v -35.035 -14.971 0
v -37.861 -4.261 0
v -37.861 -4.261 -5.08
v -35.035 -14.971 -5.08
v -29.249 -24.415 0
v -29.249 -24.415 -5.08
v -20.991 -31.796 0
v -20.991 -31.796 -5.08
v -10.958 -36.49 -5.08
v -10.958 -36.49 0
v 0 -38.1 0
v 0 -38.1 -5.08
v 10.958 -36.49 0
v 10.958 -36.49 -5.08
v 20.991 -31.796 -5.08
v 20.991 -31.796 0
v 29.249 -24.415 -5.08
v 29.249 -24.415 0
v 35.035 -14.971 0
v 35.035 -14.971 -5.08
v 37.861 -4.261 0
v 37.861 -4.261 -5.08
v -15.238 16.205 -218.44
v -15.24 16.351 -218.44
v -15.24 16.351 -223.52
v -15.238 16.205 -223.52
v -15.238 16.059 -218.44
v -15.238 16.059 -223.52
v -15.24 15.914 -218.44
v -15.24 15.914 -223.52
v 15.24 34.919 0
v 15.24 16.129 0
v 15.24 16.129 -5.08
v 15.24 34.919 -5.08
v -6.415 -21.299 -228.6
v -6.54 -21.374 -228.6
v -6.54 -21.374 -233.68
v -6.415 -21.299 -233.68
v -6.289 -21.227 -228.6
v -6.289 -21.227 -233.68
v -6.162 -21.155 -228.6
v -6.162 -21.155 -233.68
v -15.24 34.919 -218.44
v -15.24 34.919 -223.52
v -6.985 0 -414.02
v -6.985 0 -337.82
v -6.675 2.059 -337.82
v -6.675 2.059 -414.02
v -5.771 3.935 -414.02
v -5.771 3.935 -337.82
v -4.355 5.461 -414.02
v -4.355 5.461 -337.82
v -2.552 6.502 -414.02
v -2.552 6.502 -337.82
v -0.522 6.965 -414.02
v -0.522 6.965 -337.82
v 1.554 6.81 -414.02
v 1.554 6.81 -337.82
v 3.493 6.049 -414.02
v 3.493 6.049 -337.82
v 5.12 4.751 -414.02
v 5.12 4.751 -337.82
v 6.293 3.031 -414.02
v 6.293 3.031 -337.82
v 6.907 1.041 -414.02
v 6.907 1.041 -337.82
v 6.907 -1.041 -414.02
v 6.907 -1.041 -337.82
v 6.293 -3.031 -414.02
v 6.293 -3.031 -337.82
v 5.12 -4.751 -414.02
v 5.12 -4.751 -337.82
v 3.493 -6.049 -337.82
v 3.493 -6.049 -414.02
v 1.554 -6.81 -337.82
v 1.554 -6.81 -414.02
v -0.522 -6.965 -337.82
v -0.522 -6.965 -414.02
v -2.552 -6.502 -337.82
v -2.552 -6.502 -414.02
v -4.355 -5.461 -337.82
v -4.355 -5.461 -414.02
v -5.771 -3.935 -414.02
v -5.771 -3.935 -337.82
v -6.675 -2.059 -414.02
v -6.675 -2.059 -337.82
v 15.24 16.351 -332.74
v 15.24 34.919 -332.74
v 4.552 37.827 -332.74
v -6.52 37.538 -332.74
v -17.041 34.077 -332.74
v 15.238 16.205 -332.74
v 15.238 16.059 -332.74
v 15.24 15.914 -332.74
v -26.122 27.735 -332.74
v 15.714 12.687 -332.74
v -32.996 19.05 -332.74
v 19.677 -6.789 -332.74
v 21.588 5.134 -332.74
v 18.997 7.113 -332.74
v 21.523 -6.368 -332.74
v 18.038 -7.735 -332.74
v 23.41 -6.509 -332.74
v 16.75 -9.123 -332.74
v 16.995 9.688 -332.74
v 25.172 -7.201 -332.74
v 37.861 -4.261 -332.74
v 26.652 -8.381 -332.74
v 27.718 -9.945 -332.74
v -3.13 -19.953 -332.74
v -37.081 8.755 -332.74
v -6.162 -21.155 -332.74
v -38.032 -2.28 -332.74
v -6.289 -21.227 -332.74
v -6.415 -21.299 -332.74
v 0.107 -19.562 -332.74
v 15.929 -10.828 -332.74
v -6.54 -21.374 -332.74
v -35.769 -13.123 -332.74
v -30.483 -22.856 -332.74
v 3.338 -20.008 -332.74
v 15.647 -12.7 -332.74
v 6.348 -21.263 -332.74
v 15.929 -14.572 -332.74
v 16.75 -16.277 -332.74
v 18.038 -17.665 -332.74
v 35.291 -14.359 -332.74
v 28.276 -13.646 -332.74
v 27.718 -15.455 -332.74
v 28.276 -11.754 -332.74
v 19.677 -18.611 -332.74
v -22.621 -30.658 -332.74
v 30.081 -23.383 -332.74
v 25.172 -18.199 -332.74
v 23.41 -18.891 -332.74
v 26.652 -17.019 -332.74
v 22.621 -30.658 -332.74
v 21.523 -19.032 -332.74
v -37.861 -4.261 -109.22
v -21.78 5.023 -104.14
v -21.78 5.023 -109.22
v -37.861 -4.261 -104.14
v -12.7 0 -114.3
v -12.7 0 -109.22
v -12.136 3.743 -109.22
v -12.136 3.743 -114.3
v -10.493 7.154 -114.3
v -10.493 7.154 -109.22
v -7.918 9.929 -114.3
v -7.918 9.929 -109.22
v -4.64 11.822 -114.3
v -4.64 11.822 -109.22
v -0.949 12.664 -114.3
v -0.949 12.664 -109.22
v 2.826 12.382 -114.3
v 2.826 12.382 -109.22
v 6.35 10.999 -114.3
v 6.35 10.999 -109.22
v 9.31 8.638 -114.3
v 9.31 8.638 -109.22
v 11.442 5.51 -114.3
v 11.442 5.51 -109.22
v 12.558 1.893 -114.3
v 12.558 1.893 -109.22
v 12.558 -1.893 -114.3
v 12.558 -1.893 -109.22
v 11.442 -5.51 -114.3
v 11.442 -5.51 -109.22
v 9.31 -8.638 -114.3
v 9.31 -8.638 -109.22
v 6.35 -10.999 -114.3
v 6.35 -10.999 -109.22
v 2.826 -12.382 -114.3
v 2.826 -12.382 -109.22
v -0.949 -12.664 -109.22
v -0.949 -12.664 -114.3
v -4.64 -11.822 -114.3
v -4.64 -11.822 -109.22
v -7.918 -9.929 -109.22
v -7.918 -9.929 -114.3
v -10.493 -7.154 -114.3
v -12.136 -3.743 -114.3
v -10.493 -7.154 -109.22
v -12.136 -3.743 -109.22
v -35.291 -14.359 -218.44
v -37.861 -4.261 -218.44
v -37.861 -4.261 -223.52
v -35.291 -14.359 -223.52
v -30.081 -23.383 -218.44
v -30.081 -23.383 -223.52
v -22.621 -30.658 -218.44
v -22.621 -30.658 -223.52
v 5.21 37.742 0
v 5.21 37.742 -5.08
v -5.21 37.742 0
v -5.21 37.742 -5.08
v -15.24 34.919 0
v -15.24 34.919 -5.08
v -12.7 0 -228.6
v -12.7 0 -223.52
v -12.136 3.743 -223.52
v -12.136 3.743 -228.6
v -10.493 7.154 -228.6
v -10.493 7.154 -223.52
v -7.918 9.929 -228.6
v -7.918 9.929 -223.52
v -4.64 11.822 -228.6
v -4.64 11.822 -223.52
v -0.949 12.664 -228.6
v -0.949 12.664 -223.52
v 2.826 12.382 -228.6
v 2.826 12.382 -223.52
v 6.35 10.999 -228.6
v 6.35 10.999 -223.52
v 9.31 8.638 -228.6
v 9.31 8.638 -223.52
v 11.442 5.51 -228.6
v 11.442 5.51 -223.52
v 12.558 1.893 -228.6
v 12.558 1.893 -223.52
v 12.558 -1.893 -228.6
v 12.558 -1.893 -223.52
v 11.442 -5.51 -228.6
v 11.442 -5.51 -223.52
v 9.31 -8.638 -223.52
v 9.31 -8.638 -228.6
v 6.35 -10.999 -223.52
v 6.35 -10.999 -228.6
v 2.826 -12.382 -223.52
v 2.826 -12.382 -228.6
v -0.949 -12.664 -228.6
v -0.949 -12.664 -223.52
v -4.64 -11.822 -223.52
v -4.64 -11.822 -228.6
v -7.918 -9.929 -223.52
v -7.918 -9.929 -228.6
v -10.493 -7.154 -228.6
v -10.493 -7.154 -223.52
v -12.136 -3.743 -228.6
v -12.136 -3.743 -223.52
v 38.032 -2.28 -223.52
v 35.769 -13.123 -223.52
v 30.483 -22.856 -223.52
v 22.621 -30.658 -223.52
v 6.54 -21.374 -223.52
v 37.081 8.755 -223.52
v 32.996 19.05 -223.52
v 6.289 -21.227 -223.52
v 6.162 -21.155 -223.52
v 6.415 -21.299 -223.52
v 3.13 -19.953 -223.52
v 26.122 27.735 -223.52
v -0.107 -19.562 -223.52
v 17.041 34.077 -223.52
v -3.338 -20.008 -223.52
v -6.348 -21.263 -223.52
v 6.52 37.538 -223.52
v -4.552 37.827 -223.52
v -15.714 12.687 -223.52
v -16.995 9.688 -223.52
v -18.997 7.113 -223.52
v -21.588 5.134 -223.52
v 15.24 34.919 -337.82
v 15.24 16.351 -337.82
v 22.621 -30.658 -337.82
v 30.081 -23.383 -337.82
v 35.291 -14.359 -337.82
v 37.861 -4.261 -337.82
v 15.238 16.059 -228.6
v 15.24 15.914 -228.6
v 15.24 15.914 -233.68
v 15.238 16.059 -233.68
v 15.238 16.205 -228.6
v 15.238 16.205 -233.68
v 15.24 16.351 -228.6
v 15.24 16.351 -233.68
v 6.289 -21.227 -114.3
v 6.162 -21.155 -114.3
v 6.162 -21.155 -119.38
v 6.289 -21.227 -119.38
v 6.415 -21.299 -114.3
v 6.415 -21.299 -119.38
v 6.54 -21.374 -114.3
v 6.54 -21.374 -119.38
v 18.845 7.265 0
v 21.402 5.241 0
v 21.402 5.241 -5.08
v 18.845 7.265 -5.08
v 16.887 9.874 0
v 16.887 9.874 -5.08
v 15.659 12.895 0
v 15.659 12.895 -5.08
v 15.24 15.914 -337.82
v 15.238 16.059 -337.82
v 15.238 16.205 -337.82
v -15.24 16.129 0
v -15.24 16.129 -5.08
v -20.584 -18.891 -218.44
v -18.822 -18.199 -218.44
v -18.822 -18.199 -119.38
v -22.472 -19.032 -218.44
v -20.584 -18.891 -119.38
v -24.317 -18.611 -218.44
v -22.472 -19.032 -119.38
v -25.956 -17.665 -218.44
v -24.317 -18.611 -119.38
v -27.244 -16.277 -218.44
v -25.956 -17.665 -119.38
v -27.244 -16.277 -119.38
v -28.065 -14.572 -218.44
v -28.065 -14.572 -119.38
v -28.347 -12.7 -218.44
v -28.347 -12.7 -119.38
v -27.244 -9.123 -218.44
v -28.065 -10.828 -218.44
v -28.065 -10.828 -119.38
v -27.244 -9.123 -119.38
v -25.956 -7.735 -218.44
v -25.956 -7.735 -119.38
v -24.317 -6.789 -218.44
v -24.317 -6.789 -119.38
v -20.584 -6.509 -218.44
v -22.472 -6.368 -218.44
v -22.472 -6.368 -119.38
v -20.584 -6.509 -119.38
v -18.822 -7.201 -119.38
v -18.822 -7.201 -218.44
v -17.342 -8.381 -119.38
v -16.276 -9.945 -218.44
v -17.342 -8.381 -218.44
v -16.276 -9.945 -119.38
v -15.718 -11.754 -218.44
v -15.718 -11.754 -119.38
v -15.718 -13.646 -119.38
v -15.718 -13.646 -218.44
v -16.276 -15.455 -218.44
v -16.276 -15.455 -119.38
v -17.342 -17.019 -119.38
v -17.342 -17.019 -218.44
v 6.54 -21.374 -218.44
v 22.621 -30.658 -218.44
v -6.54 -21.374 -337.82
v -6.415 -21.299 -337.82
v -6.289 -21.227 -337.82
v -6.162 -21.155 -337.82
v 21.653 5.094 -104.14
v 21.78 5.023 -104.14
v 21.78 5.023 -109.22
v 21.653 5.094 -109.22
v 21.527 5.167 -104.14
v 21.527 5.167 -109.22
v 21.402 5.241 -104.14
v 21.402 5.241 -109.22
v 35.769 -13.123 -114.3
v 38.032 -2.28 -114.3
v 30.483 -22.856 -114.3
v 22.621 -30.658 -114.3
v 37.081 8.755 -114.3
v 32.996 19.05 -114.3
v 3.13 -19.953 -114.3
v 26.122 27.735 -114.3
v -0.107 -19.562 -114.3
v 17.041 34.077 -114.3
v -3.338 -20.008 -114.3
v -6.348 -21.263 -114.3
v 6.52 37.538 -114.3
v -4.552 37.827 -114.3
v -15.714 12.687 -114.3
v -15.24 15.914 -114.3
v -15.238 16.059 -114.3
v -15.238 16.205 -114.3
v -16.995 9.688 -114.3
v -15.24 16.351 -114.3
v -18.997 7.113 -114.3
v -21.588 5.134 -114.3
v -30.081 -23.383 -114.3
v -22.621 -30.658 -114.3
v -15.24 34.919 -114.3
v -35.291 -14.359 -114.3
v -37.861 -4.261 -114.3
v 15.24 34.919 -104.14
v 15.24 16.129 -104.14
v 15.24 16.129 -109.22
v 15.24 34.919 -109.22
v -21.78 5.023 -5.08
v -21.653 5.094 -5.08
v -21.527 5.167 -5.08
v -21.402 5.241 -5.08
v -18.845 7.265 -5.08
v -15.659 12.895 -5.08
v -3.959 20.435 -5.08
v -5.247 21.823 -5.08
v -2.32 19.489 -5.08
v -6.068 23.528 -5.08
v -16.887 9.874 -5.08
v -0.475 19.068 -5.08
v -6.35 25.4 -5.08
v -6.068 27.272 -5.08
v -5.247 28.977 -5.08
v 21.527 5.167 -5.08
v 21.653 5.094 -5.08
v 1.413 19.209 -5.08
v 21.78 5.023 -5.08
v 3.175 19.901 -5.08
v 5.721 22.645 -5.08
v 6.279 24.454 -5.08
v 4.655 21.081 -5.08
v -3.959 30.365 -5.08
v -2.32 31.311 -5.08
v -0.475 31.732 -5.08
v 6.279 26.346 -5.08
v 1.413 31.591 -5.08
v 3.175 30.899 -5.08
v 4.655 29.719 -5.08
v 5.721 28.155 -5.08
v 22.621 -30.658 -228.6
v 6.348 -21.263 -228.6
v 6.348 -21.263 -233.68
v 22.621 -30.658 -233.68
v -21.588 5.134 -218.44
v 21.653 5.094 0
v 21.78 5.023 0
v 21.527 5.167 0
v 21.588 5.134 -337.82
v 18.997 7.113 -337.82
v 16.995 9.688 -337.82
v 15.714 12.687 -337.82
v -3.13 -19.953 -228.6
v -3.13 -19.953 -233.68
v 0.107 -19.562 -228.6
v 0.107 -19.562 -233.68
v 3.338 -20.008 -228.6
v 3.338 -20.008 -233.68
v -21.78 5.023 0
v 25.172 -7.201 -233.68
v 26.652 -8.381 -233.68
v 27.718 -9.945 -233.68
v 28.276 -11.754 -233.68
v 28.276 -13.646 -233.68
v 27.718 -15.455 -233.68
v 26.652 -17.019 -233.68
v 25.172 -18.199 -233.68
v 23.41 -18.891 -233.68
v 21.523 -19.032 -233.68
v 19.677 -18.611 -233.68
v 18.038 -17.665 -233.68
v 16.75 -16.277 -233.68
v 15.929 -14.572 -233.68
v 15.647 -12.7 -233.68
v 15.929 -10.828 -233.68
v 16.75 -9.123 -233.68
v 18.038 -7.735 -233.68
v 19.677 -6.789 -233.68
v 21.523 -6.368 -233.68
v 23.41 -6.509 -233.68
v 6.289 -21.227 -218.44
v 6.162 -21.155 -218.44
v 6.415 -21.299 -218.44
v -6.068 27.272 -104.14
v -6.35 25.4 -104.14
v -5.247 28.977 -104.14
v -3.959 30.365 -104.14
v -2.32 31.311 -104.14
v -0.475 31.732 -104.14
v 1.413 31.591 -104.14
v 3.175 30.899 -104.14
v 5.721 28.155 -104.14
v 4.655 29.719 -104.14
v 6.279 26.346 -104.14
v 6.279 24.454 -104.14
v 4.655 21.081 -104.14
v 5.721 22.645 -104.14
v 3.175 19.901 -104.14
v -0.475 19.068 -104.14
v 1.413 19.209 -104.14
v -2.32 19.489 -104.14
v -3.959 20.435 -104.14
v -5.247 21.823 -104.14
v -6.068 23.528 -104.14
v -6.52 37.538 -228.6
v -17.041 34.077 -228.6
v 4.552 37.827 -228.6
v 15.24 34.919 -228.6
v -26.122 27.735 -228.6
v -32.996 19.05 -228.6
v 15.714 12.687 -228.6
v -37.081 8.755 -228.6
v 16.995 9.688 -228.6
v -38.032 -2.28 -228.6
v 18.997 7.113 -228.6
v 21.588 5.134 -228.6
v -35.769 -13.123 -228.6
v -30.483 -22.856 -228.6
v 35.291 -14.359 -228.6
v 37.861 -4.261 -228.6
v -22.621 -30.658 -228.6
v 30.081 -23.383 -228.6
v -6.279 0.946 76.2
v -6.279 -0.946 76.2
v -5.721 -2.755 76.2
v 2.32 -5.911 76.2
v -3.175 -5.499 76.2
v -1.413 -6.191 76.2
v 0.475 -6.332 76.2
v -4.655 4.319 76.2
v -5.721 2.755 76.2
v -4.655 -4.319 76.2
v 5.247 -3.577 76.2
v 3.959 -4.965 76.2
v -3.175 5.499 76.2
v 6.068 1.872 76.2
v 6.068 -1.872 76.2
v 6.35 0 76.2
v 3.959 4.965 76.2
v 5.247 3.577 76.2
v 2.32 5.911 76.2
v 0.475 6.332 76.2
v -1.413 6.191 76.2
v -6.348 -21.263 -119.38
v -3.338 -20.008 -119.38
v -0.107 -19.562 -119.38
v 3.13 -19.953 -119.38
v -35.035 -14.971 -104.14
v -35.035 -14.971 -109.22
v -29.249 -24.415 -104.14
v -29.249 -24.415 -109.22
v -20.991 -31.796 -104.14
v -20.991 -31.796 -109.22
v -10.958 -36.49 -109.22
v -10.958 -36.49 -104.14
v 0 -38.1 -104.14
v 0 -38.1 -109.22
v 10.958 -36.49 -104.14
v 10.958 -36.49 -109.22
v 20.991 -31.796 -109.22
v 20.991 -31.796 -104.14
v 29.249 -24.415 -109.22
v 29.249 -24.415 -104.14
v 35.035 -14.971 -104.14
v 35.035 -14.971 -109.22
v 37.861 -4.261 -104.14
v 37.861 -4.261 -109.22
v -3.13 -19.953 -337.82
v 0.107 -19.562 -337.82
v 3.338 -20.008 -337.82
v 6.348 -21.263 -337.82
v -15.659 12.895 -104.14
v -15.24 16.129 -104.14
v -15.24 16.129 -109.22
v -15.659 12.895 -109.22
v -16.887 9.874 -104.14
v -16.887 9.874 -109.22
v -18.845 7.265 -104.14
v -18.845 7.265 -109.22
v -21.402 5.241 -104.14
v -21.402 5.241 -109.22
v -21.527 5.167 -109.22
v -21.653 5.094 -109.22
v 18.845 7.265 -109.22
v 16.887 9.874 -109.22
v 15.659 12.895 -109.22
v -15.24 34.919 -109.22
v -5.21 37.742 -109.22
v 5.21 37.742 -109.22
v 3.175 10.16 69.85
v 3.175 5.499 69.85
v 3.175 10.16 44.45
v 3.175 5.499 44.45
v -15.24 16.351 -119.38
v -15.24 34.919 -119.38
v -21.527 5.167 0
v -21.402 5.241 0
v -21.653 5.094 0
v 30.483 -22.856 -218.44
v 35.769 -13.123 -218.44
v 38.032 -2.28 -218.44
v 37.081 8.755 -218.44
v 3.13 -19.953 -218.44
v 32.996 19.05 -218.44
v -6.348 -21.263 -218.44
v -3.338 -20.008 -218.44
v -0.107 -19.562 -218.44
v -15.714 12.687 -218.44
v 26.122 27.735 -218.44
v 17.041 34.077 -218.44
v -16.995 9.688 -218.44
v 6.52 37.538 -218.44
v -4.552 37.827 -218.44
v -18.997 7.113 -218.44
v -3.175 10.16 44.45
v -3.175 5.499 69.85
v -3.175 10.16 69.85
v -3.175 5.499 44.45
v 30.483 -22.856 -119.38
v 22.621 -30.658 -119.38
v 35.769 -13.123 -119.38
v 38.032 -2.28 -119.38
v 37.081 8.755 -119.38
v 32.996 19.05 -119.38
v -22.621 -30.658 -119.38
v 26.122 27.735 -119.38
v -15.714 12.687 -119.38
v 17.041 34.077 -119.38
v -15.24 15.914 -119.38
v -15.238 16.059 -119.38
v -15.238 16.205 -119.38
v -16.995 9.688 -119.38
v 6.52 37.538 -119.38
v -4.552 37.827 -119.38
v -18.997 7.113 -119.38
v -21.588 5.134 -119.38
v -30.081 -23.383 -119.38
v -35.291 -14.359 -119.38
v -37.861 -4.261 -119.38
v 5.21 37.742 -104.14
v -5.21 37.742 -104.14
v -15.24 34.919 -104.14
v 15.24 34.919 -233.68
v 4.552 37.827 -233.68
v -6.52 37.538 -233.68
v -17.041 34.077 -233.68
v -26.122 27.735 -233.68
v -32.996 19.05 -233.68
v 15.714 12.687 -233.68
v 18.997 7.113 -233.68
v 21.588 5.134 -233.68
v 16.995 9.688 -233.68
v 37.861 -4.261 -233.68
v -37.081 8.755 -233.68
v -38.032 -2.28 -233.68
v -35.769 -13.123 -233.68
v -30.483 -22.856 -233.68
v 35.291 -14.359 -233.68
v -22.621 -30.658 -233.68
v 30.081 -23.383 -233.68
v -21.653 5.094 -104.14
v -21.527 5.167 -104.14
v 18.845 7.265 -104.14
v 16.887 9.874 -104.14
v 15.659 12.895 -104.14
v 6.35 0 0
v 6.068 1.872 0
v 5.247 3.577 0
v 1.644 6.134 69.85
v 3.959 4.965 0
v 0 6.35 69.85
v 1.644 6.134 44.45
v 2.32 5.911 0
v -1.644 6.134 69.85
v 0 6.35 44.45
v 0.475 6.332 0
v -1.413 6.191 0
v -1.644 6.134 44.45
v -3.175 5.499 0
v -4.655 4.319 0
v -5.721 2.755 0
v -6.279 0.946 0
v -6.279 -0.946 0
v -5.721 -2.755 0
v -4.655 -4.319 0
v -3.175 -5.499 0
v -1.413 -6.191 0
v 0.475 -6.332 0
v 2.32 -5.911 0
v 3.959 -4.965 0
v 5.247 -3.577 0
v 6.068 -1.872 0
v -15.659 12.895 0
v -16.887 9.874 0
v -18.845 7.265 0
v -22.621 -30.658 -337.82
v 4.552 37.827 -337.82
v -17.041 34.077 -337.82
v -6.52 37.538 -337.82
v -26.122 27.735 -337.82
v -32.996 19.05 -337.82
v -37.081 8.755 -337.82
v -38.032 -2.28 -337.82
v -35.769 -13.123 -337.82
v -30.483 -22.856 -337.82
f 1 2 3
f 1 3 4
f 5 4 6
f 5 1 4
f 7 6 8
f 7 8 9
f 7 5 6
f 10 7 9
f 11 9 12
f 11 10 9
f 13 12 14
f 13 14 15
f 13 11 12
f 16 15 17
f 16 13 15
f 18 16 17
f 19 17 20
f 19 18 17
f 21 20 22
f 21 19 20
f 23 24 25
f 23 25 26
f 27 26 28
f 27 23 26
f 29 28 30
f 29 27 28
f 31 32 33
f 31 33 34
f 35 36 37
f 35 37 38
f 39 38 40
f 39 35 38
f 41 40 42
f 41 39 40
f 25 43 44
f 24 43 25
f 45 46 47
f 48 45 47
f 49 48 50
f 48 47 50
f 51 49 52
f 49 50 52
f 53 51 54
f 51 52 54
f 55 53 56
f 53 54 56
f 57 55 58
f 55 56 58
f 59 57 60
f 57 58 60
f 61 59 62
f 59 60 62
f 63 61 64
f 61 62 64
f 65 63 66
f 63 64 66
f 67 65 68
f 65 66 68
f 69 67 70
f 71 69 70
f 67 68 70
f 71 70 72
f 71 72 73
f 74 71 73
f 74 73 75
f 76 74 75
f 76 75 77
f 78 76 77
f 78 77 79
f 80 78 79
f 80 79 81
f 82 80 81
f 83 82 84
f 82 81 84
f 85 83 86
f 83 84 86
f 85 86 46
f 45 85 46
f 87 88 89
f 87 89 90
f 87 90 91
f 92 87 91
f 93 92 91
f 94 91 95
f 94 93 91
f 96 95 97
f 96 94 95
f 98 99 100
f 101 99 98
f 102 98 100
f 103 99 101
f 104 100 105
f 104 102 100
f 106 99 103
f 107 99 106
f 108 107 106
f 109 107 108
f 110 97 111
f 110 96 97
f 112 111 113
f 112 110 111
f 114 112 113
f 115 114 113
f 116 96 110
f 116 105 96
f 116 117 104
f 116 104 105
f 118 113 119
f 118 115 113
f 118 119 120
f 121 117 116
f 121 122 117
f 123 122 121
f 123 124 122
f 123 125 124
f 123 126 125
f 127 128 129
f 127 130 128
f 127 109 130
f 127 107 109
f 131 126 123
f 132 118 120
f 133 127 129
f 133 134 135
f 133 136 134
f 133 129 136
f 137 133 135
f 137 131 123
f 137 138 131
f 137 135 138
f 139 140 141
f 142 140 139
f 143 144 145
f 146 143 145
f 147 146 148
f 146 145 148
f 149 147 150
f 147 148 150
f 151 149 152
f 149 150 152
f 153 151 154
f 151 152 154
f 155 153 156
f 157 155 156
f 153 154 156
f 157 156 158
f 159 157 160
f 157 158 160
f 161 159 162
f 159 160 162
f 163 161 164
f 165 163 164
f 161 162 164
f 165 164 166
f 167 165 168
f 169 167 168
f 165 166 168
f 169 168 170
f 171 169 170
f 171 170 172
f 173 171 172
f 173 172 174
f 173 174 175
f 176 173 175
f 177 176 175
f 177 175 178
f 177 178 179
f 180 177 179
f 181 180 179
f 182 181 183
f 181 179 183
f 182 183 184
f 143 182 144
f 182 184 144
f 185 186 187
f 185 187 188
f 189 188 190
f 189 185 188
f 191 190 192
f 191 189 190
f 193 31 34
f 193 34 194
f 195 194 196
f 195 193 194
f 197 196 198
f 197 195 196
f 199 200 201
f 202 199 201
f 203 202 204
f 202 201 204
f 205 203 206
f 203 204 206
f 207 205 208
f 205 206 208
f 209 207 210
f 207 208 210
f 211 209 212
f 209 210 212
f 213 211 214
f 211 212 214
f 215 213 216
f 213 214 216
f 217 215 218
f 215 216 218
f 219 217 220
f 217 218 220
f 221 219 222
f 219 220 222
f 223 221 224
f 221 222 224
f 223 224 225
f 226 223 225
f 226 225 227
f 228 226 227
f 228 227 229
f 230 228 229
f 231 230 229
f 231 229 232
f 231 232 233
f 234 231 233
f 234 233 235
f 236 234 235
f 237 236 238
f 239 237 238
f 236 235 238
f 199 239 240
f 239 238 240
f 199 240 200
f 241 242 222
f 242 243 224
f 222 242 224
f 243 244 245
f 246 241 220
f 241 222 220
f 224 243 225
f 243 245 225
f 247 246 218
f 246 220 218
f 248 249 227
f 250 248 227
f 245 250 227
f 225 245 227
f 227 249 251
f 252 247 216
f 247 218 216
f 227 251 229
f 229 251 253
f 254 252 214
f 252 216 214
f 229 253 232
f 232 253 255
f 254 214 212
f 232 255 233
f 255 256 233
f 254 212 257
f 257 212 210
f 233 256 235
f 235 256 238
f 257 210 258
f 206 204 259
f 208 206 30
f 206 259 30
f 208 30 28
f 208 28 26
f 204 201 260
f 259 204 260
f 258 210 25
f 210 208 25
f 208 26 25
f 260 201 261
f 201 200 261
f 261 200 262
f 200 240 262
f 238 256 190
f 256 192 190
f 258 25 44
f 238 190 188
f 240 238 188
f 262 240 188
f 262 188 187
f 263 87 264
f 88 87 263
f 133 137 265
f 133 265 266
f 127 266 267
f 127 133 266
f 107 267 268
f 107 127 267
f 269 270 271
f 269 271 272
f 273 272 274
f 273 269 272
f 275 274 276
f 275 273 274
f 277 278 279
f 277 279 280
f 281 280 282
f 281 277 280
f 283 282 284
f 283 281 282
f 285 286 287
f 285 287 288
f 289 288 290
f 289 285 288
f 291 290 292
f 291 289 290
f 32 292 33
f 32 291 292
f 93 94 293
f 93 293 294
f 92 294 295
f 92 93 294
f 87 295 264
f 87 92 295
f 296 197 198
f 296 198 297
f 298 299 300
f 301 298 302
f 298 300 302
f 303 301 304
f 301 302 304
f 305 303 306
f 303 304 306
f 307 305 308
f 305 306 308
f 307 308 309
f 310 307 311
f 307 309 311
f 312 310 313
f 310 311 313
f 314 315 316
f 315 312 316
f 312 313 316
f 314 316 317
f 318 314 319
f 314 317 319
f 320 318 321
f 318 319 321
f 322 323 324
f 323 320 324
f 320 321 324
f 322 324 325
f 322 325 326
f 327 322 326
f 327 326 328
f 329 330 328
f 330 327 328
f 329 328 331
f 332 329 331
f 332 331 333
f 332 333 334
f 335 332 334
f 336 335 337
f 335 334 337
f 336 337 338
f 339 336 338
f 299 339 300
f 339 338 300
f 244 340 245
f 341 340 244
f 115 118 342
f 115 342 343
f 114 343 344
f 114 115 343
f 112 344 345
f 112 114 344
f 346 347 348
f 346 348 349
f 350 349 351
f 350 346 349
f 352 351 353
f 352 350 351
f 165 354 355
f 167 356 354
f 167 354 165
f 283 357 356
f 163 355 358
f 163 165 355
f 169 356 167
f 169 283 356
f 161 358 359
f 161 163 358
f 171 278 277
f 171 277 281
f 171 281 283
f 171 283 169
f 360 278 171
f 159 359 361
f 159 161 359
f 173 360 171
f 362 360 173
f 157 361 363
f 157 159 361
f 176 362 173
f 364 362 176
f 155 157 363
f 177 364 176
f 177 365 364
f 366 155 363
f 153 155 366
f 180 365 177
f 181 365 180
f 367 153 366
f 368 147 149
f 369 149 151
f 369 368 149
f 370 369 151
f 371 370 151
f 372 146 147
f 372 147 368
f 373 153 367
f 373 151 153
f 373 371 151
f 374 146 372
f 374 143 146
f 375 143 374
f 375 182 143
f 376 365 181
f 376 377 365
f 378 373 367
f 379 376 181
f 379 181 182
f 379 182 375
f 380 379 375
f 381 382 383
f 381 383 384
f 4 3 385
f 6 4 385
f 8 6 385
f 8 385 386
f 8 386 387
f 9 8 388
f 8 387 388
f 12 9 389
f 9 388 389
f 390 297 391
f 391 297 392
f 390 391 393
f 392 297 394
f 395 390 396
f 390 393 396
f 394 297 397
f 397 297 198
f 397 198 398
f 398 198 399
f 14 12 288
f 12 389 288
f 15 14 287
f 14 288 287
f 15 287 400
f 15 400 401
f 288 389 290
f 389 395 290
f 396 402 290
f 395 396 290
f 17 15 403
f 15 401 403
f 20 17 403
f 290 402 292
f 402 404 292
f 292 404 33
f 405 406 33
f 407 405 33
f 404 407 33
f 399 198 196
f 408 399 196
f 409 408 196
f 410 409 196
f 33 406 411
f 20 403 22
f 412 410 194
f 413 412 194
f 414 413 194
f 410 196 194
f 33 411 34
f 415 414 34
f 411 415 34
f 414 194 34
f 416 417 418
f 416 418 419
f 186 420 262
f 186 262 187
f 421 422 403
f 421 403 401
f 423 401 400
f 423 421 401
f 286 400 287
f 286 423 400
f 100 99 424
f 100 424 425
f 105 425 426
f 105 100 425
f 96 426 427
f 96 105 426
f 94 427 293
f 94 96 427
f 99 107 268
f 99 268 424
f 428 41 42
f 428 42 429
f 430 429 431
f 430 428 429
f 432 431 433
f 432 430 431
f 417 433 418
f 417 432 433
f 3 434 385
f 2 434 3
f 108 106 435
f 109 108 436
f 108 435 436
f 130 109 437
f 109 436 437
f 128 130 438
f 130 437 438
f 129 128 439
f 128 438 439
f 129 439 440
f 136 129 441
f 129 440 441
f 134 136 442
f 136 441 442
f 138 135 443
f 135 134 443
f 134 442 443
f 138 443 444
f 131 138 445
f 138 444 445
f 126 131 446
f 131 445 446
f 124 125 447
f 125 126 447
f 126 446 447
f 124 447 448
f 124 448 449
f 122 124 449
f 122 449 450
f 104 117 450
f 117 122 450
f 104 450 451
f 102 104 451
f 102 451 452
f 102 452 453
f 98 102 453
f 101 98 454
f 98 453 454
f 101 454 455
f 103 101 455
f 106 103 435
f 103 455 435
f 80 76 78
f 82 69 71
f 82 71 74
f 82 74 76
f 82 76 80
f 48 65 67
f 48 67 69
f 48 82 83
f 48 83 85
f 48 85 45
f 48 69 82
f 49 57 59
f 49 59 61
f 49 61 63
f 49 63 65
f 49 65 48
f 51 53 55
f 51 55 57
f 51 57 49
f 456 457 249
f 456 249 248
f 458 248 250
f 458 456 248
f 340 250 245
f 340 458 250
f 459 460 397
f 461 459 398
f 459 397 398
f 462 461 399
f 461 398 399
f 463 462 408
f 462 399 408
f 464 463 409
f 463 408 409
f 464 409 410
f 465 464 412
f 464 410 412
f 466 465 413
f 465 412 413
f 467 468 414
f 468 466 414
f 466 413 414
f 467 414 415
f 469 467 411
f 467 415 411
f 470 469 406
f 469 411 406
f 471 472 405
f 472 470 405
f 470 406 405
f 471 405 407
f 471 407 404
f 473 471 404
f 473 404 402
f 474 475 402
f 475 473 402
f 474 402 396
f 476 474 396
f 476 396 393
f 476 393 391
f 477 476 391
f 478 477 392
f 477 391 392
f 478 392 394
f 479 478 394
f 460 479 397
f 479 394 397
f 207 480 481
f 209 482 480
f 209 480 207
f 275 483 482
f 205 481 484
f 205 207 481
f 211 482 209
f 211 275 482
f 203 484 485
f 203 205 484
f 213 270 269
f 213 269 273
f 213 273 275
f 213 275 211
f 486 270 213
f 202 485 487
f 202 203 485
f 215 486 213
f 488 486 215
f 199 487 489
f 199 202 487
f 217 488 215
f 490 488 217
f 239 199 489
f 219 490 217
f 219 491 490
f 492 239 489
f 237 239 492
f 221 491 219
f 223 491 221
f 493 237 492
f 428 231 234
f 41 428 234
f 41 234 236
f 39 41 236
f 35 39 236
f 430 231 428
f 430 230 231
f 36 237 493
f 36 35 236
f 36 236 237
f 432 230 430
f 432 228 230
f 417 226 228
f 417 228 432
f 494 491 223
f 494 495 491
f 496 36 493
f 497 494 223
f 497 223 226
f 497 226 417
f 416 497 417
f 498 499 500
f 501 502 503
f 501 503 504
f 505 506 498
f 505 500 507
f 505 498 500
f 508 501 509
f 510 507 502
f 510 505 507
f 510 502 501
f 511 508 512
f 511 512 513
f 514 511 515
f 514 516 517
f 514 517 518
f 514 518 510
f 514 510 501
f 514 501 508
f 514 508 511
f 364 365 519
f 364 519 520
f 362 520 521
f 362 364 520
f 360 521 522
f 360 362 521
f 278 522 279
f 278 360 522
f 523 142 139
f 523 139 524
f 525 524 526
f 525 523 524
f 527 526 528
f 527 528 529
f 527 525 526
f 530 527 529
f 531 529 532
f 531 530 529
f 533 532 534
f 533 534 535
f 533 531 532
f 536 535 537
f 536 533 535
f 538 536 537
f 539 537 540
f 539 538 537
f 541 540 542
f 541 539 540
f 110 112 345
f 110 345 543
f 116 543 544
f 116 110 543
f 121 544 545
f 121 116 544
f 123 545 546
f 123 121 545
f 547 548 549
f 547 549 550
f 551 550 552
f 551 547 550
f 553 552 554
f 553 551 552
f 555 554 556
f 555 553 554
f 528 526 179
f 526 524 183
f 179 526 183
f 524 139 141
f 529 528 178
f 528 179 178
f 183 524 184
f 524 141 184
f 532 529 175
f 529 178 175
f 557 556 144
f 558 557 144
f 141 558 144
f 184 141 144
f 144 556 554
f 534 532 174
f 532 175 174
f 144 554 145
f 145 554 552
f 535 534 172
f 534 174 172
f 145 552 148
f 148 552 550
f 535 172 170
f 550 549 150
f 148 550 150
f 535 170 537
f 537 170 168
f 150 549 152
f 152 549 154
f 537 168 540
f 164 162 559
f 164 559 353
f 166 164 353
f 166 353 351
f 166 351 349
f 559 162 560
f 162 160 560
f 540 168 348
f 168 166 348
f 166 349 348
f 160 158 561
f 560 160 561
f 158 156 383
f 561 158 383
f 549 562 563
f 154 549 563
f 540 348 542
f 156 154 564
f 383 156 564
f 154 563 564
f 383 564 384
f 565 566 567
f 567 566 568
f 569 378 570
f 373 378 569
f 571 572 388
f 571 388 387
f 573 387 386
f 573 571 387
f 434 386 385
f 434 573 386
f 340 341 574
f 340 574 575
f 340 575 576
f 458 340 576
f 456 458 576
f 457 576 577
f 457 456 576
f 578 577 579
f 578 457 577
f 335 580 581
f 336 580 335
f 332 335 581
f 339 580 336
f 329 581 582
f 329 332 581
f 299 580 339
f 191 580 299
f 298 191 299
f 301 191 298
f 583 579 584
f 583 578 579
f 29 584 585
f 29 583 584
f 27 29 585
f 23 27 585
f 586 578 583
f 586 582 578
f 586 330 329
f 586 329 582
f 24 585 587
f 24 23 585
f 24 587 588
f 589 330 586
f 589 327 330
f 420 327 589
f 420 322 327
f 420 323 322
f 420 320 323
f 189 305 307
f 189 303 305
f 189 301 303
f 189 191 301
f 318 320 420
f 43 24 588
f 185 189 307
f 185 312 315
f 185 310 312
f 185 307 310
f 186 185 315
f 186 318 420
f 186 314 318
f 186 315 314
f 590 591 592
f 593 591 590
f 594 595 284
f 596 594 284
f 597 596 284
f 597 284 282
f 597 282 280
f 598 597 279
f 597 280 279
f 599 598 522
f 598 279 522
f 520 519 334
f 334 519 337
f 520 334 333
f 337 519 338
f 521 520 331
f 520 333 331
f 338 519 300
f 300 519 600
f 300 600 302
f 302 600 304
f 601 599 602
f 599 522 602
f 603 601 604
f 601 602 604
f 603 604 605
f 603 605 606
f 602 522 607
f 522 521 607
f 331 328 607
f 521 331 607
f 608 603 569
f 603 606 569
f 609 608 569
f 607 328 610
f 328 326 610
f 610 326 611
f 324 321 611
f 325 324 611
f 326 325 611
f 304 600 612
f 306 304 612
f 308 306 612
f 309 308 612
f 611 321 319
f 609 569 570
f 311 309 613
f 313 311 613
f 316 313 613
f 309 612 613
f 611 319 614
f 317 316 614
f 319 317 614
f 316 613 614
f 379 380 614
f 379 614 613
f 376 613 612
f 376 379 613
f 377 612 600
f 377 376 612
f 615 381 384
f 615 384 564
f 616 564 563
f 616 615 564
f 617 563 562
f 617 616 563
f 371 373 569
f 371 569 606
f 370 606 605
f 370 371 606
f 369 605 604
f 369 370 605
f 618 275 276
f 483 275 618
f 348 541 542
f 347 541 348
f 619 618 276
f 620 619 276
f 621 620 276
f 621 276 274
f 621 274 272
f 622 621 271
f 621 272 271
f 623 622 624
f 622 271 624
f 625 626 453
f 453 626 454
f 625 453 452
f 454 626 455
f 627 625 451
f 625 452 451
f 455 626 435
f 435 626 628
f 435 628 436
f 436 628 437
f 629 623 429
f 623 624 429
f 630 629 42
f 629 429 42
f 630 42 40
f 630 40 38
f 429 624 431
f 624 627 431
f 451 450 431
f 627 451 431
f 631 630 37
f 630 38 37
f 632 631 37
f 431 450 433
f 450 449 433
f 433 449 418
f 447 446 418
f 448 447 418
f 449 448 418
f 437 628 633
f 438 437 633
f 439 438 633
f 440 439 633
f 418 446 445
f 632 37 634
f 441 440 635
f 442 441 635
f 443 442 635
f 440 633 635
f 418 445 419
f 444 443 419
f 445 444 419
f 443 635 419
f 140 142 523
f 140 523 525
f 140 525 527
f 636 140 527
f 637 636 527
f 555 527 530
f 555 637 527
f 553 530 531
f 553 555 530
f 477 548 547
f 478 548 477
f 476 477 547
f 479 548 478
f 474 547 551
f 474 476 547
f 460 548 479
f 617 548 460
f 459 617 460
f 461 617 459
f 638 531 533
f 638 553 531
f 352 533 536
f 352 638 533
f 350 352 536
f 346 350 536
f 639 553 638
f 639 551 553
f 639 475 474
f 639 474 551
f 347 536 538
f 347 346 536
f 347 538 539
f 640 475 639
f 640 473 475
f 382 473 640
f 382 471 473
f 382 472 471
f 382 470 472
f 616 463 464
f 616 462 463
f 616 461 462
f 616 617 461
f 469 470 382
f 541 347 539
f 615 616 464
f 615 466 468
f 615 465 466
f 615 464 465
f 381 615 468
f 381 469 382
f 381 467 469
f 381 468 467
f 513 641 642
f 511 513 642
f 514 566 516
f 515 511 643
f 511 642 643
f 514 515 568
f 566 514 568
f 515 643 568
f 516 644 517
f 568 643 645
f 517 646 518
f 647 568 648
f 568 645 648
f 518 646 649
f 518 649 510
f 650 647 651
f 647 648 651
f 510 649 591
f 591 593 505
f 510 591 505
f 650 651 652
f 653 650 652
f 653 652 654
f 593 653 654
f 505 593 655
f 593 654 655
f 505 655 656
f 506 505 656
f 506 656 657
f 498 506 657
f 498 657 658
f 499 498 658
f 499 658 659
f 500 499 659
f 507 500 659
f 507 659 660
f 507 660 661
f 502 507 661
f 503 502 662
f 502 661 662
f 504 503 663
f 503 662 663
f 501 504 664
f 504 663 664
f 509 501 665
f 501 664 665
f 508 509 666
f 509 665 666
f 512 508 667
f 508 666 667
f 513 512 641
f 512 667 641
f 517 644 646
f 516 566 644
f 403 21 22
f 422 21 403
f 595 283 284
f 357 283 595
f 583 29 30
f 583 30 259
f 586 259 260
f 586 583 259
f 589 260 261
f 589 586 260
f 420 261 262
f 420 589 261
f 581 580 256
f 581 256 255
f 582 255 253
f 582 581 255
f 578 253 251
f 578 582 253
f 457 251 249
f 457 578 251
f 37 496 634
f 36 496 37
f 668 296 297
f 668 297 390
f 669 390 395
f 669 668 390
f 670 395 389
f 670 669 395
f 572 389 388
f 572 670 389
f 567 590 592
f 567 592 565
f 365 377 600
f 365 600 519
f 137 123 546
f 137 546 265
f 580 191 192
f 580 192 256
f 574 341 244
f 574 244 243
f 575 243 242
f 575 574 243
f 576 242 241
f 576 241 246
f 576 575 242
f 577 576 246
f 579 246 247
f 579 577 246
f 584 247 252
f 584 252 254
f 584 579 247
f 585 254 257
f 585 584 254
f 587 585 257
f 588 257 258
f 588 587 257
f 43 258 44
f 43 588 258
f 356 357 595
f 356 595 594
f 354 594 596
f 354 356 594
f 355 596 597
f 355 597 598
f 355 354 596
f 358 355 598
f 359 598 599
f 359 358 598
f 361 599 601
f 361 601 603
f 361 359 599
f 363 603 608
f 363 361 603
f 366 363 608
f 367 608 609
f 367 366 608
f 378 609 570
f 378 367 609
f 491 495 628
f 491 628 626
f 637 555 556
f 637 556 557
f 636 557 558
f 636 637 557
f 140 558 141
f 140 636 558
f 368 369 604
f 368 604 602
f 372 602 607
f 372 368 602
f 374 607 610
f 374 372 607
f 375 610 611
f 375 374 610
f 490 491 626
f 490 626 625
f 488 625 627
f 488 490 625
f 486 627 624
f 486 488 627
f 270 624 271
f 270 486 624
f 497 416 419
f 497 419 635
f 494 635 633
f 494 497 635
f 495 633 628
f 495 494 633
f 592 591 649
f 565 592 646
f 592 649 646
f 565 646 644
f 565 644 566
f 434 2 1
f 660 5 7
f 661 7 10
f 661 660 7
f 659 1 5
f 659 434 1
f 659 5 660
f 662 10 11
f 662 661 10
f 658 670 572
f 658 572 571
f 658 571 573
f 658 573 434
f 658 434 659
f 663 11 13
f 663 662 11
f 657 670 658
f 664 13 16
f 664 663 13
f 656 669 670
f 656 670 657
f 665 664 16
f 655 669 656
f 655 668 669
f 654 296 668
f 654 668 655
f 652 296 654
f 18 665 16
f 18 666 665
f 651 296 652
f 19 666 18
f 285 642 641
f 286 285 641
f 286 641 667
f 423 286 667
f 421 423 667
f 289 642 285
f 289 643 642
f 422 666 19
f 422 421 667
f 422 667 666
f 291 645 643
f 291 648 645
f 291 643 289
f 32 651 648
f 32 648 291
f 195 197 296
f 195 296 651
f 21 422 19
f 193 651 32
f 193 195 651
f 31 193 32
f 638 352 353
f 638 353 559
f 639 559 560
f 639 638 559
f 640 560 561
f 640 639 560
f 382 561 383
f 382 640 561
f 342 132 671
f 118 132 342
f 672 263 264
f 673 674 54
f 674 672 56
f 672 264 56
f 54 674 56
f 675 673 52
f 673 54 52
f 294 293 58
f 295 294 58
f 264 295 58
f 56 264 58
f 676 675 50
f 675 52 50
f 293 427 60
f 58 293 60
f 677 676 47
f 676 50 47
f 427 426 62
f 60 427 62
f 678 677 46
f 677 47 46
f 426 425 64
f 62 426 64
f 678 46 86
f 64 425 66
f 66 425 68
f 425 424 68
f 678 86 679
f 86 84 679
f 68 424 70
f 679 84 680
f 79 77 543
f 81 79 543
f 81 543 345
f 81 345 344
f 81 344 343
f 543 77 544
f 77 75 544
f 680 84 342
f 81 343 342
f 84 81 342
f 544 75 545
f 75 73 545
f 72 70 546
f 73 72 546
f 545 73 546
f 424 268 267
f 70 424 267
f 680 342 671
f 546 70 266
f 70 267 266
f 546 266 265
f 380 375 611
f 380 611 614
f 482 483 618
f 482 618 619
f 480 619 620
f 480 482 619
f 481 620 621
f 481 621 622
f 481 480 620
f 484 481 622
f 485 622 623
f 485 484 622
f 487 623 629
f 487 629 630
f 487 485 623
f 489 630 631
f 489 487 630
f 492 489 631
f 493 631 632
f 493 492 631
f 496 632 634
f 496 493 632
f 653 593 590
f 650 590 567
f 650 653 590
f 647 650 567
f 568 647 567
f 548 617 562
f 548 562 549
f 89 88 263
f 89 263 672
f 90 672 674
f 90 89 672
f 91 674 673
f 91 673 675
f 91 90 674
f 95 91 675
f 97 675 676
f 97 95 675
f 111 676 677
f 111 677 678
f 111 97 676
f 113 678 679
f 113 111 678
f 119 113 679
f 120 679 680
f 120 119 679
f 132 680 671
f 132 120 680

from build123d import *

# Parameters (mm, degrees)
BOSS_EXTRUDE1_DEPTH   = 5.08
LPATTERN1_COUNT       = 2
LPATTERN1_PITCH       = 104.14
SKETCH2_R             = 6.35
BOSS_EXTRUDE2_DEPTH   = 104.14
LPATTERN2_COUNT       = 3
LPATTERN2_PITCH       = 114.3
BODY_MOVE_COPY1_ANGLE = 120
BODY_MOVE_COPY2_ANGLE = 120
SKETCH3_R             = 12.7
BOSS_EXTRUDE3_DEPTH   = 5.08
BOSS_EXTRUDE4_START   = 114.3
SKETCH3_2_R           = 12.7
BOSS_EXTRUDE4_DEPTH   = 5.08
SKETCH4_R             = 6.985
BOSS_EXTRUDE5_DEPTH   = 76.2
SKETCH5_R             = 6.35
BOSS_EXTRUDE6_DEPTH   = 76.2
BOSS_EXTRUDE8_START   = 5.499261
SKETCH6_W             = 6.35
SKETCH6_H             = 25.4
BOSS_EXTRUDE8_DEPTH   = 4.660739


with BuildPart() as part:
    # Sketch1 → Boss-Extrude1 (new body)
    with BuildSketch(Plane.XY):
        with BuildLine():
            ThreePointArc((21.401887456, 5.241250721), (16.887307357, 9.873763366), (15.24, 16.129))
            Line((15.24, 16.129), (15.24, 34.919226796))
            ThreePointArc((15.24, 34.919226796), (0, 38.1), (-15.24, 34.919226796))
            Line((-15.24, 34.919226796), (-15.24, 16.129))
            ThreePointArc((-15.24, 16.129), (-16.887307357, 9.873763366), (-21.401887456, 5.241250721))
            ThreePointArc((-21.401887456, 5.241250721), (-21.59, 5.130477372), (-21.779988806, 5.022953805))
            Line((-21.779988806, 5.022953805), (-37.860937485, -4.261386244))
            ThreePointArc((-37.860937485, -4.261386244), (0, -38.1), (37.860937485, -4.261386244))
            Line((37.860937485, -4.261386244), (21.779988806, 5.022953805))
            ThreePointArc((21.779988806, 5.022953805), (21.59, 5.130477372), (21.401887456, 5.241250721))
        make_face()
    extrude(amount=-BOSS_EXTRUDE1_DEPTH)


with BuildPart() as lpattern1_1:
    # LPattern1: pattern copy
    add(part.part.moved(Location(Vector(0, 0, -1) * (1 * LPATTERN1_PITCH))))


with BuildPart() as part_1:
    add(part.part)

    add(lpattern1_1.part)  # Boss-Extrude2 merges LPattern1_1
    # Sketch2 → Boss-Extrude2 (add)
    with BuildSketch(Plane(origin=(0, 0, -5.08), x_dir=(-1, 0, 0), z_dir=(0, 0, -1))):
        with Locations((0, 25.4)):
            Circle(SKETCH2_R)
    extrude(amount=BOSS_EXTRUDE2_DEPTH)


with BuildPart() as lpattern2_1:
    # LPattern2: pattern copy
    add(part_1.part.moved(Location(Vector(0, 0, -1) * (1 * LPATTERN2_PITCH))))


with BuildPart() as lpattern2_2:
    # LPattern2: pattern copy
    add(part_1.part.moved(Location(Vector(0, 0, -1) * (2 * LPATTERN2_PITCH))))


with BuildPart() as lpattern2_1_1:
    # Body-Move/Copy1: moved
    add(lpattern2_1.part.rotate(Axis((0, 0, 0), (0, 0, 1)), BODY_MOVE_COPY1_ANGLE))


with BuildPart() as lpattern2_2_1:
    # Body-Move/Copy2: moved
    add(lpattern2_2.part.rotate(Axis((0, 0, 0), (0, 0, -1)), BODY_MOVE_COPY2_ANGLE))


with BuildPart() as part_2:
    add(part_1.part)

    add(lpattern2_1_1.part)  # Boss-Extrude3 merges LPattern2_1
    # Sketch3 → Boss-Extrude3 (add)
    with BuildSketch(Plane(origin=(0, 0, -109.22), x_dir=(-1, 0, 0), z_dir=(0, 0, -1))):
        Circle(SKETCH3_R)
    extrude(amount=BOSS_EXTRUDE3_DEPTH)

    add(lpattern2_2_1.part)  # Boss-Extrude4 merges LPattern2_2
    # Sketch3<2> → Boss-Extrude4 (add)
    with BuildSketch(Plane(origin=(0, 0, -109.22), x_dir=(-1, 0, 0), z_dir=(0, 0, -1)).offset(BOSS_EXTRUDE4_START)):
        Circle(SKETCH3_2_R)
    extrude(amount=BOSS_EXTRUDE4_DEPTH)

    # Sketch4 → Boss-Extrude5 (add)
    with BuildSketch(Plane(origin=(0, 0, -337.82), x_dir=(-1, 0, 0), z_dir=(0, 0, -1))):
        Circle(SKETCH4_R)
    extrude(amount=BOSS_EXTRUDE5_DEPTH)

    # Sketch5 → Boss-Extrude6 (add)
    with BuildSketch(Plane.XY):
        Circle(SKETCH5_R)
    extrude(amount=BOSS_EXTRUDE6_DEPTH)

    # Sketch6 → Boss-Extrude8 (add)
    with BuildSketch(Plane(origin=(0, 0, 0), x_dir=(1, 0, 0), z_dir=(0, 1, 0)).offset(BOSS_EXTRUDE8_START)):
        with Locations((0, -57.15)):
            Rectangle(SKETCH6_W, SKETCH6_H)
    extrude(amount=BOSS_EXTRUDE8_DEPTH)


solid = part_2.part
